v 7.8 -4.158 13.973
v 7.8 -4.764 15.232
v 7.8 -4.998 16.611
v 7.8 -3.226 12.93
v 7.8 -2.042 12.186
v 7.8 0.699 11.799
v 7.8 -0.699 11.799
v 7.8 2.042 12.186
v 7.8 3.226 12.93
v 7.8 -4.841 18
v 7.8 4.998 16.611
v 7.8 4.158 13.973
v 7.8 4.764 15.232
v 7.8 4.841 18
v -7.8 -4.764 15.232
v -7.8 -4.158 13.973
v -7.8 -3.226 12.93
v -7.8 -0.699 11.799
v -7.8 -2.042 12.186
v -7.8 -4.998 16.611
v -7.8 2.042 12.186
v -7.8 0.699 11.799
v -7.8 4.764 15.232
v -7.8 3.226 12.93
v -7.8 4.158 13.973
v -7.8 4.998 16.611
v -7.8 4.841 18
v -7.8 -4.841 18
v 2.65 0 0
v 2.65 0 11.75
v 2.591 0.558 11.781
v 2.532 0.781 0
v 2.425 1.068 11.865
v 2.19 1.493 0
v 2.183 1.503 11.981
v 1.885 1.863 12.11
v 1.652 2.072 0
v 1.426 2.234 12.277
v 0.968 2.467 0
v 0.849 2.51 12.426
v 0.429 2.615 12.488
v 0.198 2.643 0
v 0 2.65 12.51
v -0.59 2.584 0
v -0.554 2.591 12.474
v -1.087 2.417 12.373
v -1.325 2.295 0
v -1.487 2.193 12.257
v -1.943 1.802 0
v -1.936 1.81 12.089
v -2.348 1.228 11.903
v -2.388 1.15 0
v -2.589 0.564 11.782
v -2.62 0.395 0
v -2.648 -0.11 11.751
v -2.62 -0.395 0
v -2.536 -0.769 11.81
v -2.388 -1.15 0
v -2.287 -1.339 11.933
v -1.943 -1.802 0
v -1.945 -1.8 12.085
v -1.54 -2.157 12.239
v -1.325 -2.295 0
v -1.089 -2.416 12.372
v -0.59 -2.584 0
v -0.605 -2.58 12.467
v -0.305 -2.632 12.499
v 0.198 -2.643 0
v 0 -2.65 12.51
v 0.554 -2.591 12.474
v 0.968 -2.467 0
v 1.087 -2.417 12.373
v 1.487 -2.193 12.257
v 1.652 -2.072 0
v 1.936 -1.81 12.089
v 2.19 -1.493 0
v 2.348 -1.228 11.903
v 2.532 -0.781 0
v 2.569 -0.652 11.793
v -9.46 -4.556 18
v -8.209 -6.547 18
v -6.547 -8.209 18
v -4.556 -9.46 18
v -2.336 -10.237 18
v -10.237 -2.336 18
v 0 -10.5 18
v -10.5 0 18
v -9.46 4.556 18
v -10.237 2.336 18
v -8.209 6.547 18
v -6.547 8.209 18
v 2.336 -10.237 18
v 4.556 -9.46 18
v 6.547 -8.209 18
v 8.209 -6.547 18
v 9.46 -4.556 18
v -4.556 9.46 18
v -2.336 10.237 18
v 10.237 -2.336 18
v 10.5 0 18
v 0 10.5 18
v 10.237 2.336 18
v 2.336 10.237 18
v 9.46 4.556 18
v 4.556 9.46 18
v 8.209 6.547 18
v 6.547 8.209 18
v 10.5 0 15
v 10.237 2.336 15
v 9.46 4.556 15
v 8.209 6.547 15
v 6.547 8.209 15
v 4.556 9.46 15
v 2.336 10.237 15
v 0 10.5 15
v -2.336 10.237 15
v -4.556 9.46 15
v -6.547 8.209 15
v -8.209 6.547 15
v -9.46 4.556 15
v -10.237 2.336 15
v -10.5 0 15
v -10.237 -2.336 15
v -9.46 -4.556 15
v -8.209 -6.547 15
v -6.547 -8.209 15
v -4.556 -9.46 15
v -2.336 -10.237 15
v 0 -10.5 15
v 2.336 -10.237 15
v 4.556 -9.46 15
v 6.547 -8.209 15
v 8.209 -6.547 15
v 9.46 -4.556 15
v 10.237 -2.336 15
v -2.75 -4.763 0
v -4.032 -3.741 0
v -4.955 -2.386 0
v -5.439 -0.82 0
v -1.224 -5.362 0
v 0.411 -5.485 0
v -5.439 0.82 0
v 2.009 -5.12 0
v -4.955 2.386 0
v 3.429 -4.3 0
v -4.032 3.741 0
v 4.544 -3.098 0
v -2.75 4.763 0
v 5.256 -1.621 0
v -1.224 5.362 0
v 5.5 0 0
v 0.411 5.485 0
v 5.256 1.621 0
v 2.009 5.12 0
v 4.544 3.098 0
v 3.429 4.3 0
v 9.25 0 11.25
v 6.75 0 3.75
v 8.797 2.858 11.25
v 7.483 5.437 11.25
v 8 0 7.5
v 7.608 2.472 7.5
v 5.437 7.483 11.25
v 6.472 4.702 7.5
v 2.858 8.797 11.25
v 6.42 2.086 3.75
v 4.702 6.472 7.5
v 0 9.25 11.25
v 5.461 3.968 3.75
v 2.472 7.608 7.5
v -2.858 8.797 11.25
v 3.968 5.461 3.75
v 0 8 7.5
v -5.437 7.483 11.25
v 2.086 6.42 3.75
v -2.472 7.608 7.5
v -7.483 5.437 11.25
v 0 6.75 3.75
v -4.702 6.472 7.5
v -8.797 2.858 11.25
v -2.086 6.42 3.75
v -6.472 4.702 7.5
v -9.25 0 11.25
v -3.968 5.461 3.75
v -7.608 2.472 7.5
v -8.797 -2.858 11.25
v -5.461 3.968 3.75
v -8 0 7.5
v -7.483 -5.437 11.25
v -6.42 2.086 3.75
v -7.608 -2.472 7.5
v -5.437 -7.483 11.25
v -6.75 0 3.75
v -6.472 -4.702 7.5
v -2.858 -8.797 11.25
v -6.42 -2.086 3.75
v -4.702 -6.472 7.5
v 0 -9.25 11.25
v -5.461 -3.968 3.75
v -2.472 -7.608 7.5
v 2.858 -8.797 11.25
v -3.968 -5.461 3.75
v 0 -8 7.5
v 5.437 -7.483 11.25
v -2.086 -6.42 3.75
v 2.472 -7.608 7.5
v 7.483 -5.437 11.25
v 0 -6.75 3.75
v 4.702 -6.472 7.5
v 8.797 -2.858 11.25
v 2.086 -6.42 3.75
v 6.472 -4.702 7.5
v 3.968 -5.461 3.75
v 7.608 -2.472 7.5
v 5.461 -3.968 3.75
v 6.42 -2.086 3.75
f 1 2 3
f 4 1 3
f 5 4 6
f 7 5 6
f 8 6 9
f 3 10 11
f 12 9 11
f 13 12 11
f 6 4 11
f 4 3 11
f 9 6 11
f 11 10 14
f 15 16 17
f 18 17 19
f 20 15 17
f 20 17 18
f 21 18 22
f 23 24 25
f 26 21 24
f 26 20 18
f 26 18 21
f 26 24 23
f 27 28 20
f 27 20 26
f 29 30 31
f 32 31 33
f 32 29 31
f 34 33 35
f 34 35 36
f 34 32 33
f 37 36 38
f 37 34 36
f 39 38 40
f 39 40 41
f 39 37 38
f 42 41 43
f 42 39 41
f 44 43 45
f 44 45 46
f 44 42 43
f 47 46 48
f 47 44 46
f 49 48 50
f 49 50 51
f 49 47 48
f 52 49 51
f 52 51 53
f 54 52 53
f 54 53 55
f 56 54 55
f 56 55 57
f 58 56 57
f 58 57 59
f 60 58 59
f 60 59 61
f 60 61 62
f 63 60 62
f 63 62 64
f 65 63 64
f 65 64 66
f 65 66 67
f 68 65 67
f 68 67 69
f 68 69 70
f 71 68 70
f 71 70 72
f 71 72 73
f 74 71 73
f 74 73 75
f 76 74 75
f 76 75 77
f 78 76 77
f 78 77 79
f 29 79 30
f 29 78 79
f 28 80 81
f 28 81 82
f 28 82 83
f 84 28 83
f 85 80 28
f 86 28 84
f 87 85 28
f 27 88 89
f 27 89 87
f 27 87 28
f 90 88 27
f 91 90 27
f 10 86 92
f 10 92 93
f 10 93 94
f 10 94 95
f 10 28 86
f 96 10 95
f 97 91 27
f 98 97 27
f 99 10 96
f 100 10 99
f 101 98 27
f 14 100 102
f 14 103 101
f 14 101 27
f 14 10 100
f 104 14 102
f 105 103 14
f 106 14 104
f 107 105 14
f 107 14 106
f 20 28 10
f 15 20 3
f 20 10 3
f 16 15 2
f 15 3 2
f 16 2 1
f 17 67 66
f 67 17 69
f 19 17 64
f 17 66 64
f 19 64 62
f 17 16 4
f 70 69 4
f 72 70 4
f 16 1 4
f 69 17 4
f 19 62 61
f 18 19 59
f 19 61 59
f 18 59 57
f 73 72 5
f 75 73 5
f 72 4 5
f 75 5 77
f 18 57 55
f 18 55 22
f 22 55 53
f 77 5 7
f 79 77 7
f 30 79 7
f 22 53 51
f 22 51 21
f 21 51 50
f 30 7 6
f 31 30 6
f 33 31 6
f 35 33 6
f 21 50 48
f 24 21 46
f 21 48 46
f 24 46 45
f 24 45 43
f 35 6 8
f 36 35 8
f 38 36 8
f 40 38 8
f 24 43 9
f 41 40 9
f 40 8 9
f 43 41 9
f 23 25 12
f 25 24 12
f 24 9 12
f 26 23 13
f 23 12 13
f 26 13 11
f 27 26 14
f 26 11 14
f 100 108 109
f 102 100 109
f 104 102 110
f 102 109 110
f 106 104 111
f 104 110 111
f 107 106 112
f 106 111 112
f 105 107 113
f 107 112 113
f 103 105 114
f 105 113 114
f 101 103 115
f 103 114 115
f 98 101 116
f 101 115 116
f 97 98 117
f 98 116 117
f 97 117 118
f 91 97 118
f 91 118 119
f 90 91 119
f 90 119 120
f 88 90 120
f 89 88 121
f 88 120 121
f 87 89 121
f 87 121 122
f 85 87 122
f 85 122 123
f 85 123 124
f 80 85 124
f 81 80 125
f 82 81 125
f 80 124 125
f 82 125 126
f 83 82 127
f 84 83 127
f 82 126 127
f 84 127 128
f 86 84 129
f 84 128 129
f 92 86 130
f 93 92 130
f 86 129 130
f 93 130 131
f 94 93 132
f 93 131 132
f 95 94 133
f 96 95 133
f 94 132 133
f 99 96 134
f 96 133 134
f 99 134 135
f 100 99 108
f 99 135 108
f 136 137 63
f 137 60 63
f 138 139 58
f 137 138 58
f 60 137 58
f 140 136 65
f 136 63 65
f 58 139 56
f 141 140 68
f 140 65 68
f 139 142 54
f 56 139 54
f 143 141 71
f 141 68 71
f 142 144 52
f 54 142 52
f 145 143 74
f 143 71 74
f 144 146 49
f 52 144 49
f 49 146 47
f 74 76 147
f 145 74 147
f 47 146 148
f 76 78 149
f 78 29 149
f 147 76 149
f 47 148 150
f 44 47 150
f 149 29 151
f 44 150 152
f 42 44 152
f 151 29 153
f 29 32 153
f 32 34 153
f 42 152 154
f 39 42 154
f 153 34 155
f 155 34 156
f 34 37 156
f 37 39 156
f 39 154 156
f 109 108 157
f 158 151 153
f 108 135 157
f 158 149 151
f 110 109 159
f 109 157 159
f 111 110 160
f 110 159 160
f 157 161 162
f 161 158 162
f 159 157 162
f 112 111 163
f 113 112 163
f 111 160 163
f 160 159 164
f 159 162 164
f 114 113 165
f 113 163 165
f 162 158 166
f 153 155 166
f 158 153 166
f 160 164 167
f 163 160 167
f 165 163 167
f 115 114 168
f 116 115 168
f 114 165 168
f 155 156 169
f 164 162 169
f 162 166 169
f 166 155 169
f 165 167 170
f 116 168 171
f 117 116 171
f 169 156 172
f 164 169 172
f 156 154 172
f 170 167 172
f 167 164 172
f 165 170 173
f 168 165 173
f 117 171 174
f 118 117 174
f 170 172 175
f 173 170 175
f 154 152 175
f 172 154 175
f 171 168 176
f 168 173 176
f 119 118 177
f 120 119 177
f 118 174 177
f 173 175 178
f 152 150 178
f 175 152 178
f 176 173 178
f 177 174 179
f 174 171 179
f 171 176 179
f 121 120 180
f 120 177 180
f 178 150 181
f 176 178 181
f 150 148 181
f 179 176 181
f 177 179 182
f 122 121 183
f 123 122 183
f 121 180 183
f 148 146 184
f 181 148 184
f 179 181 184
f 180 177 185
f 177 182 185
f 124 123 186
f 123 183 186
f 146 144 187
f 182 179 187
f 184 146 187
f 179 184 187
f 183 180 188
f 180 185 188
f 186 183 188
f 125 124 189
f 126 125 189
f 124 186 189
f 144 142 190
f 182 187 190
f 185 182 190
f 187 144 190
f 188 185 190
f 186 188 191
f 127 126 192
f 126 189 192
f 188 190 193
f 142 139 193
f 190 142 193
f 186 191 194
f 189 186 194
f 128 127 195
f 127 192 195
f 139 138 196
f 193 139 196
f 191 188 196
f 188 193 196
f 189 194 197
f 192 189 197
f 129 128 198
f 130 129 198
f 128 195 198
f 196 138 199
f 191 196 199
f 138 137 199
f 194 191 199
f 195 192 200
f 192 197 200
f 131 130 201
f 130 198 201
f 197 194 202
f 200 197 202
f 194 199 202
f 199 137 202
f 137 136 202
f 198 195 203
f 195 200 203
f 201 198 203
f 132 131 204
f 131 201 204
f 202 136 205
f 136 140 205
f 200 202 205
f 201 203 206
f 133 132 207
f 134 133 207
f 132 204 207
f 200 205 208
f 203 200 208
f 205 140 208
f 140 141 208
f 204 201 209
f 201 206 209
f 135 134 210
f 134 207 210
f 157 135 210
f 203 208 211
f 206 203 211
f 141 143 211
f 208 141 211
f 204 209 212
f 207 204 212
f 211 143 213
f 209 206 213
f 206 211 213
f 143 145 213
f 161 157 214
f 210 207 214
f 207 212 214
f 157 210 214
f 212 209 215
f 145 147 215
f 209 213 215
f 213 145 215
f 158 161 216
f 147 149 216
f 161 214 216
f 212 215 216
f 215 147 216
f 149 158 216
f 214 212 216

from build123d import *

# Parameters (mm, degrees)
F0_R          = 10.5
F0_R_2        = 2.65
F1_DEPTH      = 18
F2_R          = 5
F3_DEPTH      = 7.8
F3_DEPTH_BACK = 7.8
F4_SIZE2      = 5
F4_SIZE       = 15


with BuildPart() as f1:
    # F0 (on Top) → F1 (new body)
    with BuildSketch(Plane.XY):
        Circle(F0_R)
        Circle(F0_R_2, mode=Mode.SUBTRACT)
    extrude(amount=F1_DEPTH)

    # F2 (on Right) → F3 (cut, two sides)
    with BuildSketch(Plane.YZ) as f3_sk:
        with Locations((0, 16.75)):
            Circle(F2_R)
    extrude(amount=-F3_DEPTH, mode=Mode.SUBTRACT)
    extrude(f3_sk.sketch, amount=F3_DEPTH_BACK, mode=Mode.SUBTRACT)

    # F4
    f4_edges = [f1.edges().sort_by_distance(p)[0] for p in [
        (-10.5, 0, 0),
    ]]
    f4_side = f1.faces().sort_by_distance((-10.5, 0, 9))[0]
    chamfer(f4_edges, length=F4_SIZE, length2=F4_SIZE2, reference=f4_side)


solid = f1.part
